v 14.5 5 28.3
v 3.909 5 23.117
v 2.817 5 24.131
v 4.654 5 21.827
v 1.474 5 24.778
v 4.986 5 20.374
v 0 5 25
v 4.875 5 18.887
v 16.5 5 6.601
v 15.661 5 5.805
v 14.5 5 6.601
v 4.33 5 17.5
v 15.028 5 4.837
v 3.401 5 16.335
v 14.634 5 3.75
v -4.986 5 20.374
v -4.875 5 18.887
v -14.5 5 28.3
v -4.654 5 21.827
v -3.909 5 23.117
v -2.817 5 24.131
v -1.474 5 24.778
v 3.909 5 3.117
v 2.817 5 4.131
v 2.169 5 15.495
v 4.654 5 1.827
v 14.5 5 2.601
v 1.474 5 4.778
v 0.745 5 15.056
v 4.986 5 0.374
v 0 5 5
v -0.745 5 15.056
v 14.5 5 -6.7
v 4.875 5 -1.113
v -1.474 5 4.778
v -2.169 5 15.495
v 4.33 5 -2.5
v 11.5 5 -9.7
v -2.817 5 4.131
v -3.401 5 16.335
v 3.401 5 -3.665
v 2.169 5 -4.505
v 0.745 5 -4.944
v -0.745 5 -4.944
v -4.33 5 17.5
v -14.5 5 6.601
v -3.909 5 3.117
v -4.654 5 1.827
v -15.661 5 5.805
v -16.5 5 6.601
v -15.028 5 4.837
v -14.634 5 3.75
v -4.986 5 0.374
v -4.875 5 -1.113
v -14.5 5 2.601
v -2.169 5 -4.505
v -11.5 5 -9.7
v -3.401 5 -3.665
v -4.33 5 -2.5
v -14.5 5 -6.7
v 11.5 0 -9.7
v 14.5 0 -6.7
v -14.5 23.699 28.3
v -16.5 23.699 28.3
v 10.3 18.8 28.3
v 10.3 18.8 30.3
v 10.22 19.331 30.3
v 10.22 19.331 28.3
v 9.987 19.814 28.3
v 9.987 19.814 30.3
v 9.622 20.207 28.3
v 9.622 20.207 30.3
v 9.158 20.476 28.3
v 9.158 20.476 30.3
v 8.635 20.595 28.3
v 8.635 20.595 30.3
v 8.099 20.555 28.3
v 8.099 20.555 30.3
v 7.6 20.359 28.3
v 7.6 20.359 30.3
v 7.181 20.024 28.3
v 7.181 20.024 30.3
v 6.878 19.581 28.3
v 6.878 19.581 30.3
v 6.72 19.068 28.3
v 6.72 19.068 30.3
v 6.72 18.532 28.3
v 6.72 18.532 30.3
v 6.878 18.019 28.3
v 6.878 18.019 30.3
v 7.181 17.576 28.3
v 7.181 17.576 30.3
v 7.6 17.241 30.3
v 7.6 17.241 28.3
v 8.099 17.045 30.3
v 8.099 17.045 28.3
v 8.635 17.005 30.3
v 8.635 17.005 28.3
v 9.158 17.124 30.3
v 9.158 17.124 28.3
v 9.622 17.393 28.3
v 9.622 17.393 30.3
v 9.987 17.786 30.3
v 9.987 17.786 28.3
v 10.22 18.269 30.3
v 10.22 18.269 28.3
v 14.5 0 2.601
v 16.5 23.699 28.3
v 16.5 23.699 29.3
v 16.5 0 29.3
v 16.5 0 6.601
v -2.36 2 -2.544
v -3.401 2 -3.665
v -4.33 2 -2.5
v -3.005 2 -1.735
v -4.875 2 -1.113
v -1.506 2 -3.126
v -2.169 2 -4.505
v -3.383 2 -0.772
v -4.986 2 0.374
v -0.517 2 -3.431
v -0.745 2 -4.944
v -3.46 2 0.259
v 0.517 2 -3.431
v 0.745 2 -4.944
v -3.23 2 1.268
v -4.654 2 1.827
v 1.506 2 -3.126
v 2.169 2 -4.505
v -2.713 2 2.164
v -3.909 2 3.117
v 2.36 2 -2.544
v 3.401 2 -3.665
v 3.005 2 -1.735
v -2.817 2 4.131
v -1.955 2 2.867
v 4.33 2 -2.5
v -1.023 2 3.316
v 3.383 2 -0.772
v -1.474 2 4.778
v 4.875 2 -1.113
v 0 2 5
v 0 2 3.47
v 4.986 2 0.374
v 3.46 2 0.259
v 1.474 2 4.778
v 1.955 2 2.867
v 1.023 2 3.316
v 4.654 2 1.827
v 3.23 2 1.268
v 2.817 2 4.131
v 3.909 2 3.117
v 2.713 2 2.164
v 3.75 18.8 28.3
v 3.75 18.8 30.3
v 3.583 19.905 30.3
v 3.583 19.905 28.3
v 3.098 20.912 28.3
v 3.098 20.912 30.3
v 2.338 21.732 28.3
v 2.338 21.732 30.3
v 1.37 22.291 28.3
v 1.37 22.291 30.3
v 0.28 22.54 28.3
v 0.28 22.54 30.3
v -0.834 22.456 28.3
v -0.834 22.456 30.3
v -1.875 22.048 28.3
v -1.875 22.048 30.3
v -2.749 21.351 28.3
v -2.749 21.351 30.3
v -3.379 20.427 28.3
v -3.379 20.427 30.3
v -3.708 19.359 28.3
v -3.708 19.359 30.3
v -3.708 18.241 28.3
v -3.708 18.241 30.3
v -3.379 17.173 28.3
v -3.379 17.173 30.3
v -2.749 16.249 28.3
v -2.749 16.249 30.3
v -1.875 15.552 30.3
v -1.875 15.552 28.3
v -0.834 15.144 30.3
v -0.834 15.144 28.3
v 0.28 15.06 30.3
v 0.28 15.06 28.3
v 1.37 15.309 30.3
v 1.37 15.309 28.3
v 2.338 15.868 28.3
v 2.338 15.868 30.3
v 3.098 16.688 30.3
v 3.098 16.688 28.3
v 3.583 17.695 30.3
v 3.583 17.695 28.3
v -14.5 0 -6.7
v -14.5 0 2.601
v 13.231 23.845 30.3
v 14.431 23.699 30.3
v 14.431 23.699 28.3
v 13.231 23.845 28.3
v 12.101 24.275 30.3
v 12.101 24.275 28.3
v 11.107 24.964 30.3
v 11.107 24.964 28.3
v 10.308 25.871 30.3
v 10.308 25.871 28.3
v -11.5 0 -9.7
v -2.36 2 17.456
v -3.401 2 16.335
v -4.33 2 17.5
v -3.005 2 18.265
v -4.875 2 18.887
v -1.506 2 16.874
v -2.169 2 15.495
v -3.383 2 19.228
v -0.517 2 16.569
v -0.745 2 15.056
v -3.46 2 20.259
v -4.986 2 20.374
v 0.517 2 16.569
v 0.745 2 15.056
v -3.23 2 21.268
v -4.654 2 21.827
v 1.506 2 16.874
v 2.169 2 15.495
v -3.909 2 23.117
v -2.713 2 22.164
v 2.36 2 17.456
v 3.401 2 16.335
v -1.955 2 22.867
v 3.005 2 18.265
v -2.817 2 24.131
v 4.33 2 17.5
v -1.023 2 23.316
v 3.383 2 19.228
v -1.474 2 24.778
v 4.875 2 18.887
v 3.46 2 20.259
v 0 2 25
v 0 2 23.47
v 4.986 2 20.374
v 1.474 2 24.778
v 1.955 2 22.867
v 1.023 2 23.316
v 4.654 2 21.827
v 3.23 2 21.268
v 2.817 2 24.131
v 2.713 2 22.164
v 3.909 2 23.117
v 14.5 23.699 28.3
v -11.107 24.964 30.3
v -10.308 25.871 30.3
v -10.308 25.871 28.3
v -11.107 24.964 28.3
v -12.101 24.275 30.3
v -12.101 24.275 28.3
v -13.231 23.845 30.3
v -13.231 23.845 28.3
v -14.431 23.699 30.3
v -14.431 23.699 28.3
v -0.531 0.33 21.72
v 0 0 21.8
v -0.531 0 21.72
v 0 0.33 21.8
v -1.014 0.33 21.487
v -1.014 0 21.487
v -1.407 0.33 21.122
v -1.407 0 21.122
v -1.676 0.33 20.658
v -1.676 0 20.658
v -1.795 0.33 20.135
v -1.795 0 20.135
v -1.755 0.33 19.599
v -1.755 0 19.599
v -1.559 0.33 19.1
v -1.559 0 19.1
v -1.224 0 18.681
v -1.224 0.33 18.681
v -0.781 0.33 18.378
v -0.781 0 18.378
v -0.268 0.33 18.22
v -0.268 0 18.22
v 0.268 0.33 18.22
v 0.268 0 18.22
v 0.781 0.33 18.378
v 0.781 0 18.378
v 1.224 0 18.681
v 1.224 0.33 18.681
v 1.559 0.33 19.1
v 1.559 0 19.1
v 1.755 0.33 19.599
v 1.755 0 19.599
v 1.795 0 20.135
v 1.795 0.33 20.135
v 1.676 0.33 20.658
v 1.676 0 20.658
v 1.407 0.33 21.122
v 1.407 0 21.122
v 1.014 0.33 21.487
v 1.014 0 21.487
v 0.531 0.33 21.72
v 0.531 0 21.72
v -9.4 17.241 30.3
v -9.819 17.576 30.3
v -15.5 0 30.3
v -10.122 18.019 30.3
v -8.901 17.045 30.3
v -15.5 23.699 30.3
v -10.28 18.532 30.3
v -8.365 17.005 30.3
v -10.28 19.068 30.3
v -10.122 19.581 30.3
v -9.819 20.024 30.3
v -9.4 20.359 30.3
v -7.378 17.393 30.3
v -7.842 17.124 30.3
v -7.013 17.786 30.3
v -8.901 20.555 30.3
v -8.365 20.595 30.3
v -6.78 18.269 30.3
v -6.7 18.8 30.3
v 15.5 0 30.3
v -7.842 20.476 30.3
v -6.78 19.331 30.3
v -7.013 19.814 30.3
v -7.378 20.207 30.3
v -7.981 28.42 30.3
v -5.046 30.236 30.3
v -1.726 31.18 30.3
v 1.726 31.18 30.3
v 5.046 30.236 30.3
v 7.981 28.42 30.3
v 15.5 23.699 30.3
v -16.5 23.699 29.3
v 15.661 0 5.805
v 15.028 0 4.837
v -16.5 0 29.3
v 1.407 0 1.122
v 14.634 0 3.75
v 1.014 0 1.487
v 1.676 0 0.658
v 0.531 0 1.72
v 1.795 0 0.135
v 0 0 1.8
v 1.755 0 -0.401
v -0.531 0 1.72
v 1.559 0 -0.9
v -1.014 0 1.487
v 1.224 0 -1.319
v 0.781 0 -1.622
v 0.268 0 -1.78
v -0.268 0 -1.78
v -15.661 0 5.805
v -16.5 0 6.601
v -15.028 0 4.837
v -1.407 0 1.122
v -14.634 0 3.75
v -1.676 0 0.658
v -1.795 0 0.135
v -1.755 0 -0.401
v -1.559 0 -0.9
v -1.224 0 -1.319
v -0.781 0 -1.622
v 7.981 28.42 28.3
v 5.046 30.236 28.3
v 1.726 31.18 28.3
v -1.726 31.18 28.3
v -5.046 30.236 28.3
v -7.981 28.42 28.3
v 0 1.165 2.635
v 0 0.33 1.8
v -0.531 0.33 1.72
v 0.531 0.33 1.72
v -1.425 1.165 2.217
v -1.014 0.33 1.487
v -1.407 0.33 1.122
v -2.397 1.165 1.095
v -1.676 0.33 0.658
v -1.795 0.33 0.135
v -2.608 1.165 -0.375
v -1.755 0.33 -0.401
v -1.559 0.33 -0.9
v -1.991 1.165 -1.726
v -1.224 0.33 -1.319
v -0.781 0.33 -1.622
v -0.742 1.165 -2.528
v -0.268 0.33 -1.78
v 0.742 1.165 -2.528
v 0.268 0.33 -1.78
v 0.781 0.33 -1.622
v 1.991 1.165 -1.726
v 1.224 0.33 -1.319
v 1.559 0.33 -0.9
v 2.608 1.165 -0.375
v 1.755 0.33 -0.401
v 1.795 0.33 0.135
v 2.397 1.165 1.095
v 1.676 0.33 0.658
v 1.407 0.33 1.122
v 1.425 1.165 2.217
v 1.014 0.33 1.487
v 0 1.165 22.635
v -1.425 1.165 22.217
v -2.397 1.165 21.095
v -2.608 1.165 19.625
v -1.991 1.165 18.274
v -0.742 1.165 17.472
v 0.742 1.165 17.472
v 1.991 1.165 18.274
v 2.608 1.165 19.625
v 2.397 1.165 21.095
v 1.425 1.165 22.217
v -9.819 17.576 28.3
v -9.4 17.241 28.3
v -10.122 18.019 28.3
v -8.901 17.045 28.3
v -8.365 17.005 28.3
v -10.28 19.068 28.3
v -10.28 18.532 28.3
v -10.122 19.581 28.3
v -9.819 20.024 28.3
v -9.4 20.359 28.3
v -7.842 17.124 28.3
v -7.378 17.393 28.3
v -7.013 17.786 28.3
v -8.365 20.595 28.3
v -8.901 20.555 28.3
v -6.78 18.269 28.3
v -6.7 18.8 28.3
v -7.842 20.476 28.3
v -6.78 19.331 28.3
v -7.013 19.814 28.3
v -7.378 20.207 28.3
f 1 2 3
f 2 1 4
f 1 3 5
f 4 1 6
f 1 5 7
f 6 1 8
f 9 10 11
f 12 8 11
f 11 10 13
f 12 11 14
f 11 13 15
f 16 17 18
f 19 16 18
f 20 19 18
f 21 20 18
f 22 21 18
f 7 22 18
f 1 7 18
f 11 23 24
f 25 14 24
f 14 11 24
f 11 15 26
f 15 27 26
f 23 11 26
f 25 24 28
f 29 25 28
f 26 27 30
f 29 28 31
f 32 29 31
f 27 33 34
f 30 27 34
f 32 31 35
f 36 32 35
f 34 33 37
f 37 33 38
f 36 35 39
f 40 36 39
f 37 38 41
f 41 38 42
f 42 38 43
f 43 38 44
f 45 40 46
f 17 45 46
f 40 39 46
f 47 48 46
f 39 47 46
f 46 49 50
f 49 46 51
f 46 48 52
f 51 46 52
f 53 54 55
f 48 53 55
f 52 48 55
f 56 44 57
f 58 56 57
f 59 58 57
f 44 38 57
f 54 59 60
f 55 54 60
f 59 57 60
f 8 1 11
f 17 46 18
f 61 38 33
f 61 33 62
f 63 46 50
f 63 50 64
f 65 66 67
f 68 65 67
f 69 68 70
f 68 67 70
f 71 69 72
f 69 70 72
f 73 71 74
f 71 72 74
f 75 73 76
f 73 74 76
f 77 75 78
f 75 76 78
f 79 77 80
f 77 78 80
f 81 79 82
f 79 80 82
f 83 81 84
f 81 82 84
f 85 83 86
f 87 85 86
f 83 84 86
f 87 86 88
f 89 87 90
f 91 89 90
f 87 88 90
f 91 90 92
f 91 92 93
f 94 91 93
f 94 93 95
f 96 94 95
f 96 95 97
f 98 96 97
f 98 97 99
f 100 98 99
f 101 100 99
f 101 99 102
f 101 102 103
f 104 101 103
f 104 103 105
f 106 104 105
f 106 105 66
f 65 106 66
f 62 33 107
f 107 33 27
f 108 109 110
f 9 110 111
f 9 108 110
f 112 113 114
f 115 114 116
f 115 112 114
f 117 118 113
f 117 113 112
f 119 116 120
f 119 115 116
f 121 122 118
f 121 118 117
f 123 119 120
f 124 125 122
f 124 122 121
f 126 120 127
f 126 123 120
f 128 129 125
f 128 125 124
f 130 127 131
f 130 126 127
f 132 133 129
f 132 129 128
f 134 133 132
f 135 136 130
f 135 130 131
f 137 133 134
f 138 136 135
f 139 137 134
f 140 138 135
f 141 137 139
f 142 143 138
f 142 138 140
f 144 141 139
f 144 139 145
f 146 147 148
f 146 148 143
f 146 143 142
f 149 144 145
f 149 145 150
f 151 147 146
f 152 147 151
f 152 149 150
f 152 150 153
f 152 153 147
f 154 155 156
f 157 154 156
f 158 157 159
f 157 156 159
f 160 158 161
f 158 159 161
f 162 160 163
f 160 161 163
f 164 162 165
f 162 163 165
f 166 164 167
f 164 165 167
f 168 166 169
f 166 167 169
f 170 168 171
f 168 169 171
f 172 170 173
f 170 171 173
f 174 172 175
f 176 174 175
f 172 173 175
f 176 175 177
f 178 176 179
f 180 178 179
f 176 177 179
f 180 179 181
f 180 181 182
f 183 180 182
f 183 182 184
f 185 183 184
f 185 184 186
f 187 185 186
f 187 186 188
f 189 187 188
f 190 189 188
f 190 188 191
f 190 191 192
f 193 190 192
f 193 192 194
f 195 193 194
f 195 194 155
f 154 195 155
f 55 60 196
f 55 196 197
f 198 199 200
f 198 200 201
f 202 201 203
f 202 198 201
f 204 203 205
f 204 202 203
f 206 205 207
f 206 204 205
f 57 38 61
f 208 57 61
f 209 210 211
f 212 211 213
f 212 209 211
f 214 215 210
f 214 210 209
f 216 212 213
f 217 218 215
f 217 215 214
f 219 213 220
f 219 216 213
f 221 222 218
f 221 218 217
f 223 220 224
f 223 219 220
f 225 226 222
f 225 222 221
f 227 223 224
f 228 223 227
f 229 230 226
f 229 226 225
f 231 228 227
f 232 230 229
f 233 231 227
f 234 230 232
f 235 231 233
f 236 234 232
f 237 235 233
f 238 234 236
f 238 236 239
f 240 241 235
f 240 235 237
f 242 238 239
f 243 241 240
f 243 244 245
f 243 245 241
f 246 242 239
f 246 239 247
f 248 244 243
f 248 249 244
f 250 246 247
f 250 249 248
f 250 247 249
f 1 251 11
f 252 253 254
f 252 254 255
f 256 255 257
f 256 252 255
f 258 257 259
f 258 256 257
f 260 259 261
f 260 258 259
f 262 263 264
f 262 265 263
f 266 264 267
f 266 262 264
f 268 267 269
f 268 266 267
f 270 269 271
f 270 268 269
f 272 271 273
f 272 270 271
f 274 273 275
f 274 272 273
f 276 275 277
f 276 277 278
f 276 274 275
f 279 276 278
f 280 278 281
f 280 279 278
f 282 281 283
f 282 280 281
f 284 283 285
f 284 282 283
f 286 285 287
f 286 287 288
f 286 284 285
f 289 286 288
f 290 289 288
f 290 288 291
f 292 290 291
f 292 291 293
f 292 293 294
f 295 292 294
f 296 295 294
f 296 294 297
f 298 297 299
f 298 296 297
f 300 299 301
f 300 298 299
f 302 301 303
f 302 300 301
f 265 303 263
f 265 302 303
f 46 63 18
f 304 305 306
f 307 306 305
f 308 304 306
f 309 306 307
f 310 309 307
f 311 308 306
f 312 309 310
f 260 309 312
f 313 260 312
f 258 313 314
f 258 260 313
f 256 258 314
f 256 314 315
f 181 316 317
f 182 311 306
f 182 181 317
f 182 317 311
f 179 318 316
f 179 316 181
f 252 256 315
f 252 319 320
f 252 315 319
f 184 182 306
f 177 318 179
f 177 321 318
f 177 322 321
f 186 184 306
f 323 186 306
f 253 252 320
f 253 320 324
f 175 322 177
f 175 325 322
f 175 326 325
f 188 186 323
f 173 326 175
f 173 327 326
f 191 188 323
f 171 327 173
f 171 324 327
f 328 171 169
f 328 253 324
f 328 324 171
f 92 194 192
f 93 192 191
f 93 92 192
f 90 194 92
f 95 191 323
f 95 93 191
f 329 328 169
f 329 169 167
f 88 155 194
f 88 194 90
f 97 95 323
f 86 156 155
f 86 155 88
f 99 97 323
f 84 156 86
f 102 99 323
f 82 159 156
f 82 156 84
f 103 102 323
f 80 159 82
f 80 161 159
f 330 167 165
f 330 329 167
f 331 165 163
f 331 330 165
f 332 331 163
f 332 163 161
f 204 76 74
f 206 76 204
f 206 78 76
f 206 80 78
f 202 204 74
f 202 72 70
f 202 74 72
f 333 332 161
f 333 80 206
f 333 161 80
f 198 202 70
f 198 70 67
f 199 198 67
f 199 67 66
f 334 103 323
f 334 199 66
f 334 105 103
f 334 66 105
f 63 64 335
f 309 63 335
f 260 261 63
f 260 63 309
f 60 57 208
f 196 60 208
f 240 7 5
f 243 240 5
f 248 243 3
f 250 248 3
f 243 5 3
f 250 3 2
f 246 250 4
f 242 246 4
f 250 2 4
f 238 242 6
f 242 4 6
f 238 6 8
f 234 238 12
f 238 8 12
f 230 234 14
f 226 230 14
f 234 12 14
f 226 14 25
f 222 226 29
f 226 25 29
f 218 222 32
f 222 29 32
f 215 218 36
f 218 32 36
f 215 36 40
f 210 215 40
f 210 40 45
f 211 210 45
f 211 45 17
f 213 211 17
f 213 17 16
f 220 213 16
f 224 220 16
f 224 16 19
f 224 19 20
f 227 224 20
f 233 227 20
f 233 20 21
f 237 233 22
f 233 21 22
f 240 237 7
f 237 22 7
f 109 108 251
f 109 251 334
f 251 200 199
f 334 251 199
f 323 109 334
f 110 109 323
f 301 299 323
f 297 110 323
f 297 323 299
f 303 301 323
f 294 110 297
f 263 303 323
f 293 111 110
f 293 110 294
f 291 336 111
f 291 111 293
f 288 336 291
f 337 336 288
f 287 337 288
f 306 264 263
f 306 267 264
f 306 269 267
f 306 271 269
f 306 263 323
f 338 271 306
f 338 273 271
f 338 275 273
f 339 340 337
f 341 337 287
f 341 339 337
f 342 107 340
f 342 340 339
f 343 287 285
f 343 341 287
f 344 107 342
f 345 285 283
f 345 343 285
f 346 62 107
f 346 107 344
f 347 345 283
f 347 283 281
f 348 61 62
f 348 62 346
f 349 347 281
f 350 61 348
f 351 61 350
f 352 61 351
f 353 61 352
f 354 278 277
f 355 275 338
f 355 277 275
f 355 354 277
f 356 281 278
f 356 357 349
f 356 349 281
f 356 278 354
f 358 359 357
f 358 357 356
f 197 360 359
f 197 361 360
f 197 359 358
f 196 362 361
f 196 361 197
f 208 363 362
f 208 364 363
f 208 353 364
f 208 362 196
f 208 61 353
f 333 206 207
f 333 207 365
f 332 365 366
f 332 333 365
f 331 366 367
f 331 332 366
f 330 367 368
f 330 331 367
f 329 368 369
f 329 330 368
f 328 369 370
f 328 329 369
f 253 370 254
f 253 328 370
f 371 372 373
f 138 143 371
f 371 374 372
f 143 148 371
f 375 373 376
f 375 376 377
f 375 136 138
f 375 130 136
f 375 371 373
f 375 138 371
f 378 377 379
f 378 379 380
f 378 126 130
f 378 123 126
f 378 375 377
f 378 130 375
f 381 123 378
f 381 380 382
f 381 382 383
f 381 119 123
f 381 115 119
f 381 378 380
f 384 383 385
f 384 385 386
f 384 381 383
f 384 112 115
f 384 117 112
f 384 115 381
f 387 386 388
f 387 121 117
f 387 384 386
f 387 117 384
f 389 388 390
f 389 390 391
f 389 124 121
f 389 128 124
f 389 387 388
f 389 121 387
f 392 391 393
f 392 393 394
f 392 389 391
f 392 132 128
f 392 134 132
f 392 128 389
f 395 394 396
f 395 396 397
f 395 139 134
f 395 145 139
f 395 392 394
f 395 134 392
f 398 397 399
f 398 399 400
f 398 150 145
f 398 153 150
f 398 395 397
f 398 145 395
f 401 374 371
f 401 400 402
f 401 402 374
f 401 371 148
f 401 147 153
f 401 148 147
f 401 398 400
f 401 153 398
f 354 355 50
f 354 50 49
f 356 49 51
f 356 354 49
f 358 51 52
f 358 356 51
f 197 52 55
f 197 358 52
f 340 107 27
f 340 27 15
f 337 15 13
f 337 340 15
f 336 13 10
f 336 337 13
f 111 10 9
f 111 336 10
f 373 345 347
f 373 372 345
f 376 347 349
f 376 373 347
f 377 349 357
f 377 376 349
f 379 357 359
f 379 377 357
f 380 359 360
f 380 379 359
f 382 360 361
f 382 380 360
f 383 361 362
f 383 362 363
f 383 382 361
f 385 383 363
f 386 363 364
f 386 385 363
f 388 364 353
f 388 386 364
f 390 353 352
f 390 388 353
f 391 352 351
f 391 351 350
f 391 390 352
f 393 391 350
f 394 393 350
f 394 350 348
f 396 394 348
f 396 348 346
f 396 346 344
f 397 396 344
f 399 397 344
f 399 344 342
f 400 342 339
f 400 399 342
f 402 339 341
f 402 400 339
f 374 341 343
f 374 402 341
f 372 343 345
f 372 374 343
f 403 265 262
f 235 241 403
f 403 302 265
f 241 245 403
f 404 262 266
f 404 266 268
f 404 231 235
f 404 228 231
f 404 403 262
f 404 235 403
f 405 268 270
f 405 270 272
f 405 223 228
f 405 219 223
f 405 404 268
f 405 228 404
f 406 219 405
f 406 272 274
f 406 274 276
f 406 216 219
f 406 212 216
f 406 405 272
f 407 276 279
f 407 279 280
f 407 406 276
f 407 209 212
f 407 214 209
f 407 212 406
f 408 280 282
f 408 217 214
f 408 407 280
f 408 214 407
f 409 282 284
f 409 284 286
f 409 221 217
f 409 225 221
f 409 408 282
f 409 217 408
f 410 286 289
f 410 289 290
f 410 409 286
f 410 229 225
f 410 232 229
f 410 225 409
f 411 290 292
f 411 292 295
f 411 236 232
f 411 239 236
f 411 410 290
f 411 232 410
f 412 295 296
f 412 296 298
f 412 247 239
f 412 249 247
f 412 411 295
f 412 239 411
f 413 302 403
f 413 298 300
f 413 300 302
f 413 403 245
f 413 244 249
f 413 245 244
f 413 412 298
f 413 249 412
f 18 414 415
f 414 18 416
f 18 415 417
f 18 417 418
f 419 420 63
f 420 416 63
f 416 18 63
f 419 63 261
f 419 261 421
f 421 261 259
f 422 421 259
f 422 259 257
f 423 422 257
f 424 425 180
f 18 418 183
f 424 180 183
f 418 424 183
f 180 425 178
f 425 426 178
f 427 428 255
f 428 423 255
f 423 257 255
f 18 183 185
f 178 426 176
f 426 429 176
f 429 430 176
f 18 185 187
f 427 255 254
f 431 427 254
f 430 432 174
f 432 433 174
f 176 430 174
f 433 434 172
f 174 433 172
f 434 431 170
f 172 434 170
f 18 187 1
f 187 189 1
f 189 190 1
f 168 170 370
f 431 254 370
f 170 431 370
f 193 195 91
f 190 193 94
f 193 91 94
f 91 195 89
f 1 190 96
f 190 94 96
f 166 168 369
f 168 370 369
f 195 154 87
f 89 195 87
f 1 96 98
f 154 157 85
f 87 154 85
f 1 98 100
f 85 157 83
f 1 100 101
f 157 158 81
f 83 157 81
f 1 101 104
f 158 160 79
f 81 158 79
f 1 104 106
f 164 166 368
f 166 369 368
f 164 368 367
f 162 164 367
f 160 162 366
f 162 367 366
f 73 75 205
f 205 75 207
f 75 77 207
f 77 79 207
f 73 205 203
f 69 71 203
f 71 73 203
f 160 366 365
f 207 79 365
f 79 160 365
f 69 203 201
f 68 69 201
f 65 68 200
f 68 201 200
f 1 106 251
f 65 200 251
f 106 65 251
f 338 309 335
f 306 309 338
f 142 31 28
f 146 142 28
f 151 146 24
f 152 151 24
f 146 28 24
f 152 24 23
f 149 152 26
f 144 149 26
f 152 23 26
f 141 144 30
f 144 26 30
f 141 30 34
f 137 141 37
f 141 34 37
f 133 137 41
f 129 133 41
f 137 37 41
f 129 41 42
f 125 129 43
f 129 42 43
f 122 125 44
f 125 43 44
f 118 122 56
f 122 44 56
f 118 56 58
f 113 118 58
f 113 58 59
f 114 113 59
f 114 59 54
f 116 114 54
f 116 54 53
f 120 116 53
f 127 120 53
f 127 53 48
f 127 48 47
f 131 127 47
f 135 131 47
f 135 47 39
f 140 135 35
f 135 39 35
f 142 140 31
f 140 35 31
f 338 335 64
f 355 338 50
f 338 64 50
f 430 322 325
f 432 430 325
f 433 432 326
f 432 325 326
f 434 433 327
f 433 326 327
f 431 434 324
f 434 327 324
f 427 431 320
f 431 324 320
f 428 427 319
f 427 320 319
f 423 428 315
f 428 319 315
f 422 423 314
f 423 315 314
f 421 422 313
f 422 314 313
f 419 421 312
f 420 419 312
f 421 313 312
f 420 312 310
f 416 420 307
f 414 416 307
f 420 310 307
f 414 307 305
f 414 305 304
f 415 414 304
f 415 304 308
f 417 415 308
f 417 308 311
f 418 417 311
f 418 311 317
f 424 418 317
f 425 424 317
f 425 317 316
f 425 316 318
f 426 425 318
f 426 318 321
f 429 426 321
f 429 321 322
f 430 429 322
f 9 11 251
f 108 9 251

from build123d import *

# Parameters (mm, degrees)
SKETCH1_W                                    = 23
SKETCH1_H                                    = 40
SKETCH1_R                                    = 1.75
BOSS_EXTRUDE1_DEPTH                          = 5
SKETCH2_W                                    = 23
SKETCH2_H                                    = 2
BOSS_EXTRUDE2_DEPTH                          = 50
SKETCH3_R                                    = 1.8
SKETCH3_R_2                                  = 3.75
CUT_EXTRUDE1_DEPTH                           = 69.972820734
BOSS_EXTRUDE3_DEPTH                          = 3
BOSS_EXTRUDE4_START                          = -23
BOSS_EXTRUDE4_DEPTH                          = 3
BOSS_EXTRUDE5_DEPTH                          = 2
BOSS_EXTRUDE6_START                          = -29
BOSS_EXTRUDE6_DEPTH                          = 2
SKETCH6_R                                    = 5
CUT_EXTRUDE2_DEPTH                           = 3
CSK_FOR_M3_HEX_SOCKET_COUNTERSUNK_HE_2_COUNT = 2
CSK_FOR_M3_HEX_SOCKET_COUNTERSUNK_HE_2_PITCH = 20
CHAMFER1_SIZE                                = 3
CHAMFER2_SIZE                                = 1
FILLET1_R                                    = 5


with BuildPart() as part:
    # Sketch1 → Boss-Extrude1 (new body)
    with BuildSketch(Plane(origin=(0, 0, 0), x_dir=(1, 0, 0), z_dir=(0, 1, 0))):
        with Locations((0, -10.3)):
            Rectangle(SKETCH1_W, SKETCH1_H)
        with Locations(Location((0, 0, 0), (0, 0, 270))):
            Circle(SKETCH1_R, mode=Mode.SUBTRACT)
        with Locations(Location((0, -20, 0), (0, 0, 270))):
            Circle(SKETCH1_R, mode=Mode.SUBTRACT)
    extrude(amount=BOSS_EXTRUDE1_DEPTH)

    # Sketch2 → Boss-Extrude2 (add)
    with BuildSketch(Plane(origin=(0, 5, 0), x_dir=(1, 0, 0), z_dir=(0, 1, 0))):
        with Locations((0, -29.3)):
            Rectangle(SKETCH2_W, SKETCH2_H)
    extrude(amount=BOSS_EXTRUDE2_DEPTH)

    # Sketch3 → Cut-Extrude1 (cut, through all)
    with BuildSketch(Plane.XY.offset(30.3)):
        with Locations((-8.5, 18.8)):
            Circle(SKETCH3_R)
        with Locations((8.5, 18.8)):
            Circle(SKETCH3_R)
        with Locations((0, 18.8)):
            Circle(SKETCH3_R_2)
        with BuildLine():
            Line((-11.5, 23.698979486), (-11.5, 55))
            Line((-11.5, 55), (11.5, 55))
            Line((11.5, 55), (11.5, 23.698979486))
            ThreePointArc((11.5, 23.698979486), (0, 31.3), (-11.5, 23.698979486))
        make_face()
    extrude(amount=-CUT_EXTRUDE1_DEPTH, mode=Mode.SUBTRACT)

    # Sketch4 → Boss-Extrude3 (add)
    with BuildSketch(Plane.ZY.offset(11.5)):
        Polygon((30.3, 0), (30.3, 23.698979486), (28.3, 23.698979486), (28.3, 5), (-9.7, 5), (-9.7, 0), align=None)
    extrude(amount=BOSS_EXTRUDE3_DEPTH)

    # Sketch4<2> → Boss-Extrude4 (add)
    with BuildSketch(Plane.ZY.offset(11.5).offset(BOSS_EXTRUDE4_START)):
        Polygon((30.3, 0), (30.3, 23.698979486), (28.3, 23.698979486), (28.3, 5), (-9.7, 5), (-9.7, 0), align=None)
    extrude(amount=-BOSS_EXTRUDE4_DEPTH)

    # Sketch5 → Boss-Extrude5 (add)
    with BuildSketch(Plane(origin=(14.5, 0, 0), x_dir=(0, 0, -1), z_dir=(1, 0, 0))):
        Polygon((-30.3, 23.698979486), (-30.3, 0), (-6.601020514, 0), (-6.601020514, 5), (-28.3, 23.698979486), align=None)
    extrude(amount=BOSS_EXTRUDE5_DEPTH)

    # Sketch5<2> → Boss-Extrude6 (add)
    with BuildSketch(Plane(origin=(14.5, 0, 0), x_dir=(0, 0, -1), z_dir=(1, 0, 0)).offset(BOSS_EXTRUDE6_START)):
        Polygon((-30.3, 23.698979486), (-30.3, 0), (-6.601020514, 0), (-6.601020514, 5), (-28.3, 23.698979486), align=None)
    extrude(amount=-BOSS_EXTRUDE6_DEPTH)

    # Sketch6 → Cut-Extrude2 (cut)
    with BuildSketch(Plane(origin=(0, 5, 0), x_dir=(1, 0, 0), z_dir=(0, 1, 0))):
        with Locations(Location((0, 0, 0), (0, 0, 270))):
            Circle(SKETCH6_R)
        with Locations(Location((0, -20, 0), (0, 0, 270))):
            Circle(SKETCH6_R)
    extrude(amount=-CUT_EXTRUDE2_DEPTH, mode=Mode.SUBTRACT)

    # Sketch8 → CSK for M3 Hex Socket Countersunk Head Screw1 (revolve, cut)
    with BuildSketch(Plane(origin=(0, 2, 0), x_dir=(0, 0, 1), z_dir=(1, 0, 0))):
        Polygon((0, 0), (0, 2), (1.8, 2), (1.8, 1.67), (3.47, 0), align=None)
    csk_for_m3_hex_socket_countersunk_head_s = revolve(axis=Axis((0, 8.35, 0), (0, -1, 0)), mode=Mode.SUBTRACT)

    # CSK for M3 Hex Socket Countersunk He 2: CSK for M3 Hex Socket Countersunk Head Screw1 ×2
    with Locations(*[(0, 0, i * CSK_FOR_M3_HEX_SOCKET_COUNTERSUNK_HE_2_PITCH) for i in range(1, CSK_FOR_M3_HEX_SOCKET_COUNTERSUNK_HE_2_COUNT)]):
        add(csk_for_m3_hex_socket_countersunk_head_s, mode=Mode.SUBTRACT)

    # Chamfer1
    chamfer1_edges = [part.edges().sort_by_distance(p)[0] for p in [
        (-14.5, 2.5, -9.7),
        (14.5, 2.5, -9.7),
    ]]
    chamfer(chamfer1_edges, length=CHAMFER1_SIZE)

    # Chamfer2
    chamfer2_edges = [part.edges().sort_by_distance(p)[0] for p in [
        (16.5, 11.849489743, 30.3),
        (-16.5, 11.849489743, 30.3),
    ]]
    chamfer(chamfer2_edges, length=CHAMFER2_SIZE)

    # Fillet1
    # the kernel refuses this fillet: 5 mm, written as the material it adds along each edge
    with BuildSketch(Plane(origin=(11.5, 23.698979486, 30.3), x_dir=(1, 0, 0), z_dir=(0, 0, -1))) as fillet1_piece_1:
        with BuildLine():
            CenterArc((2.931223273, -5), FILLET1_R, 90, 55.552144514)
            ThreePointArc((-1.191983377, -2.171720147), (-0.54205816, -1.115462354), (0, 0))
            Line((0, 0), (2.931223273, 0))
        make_face()
    extrude(amount=2)
    with BuildSketch(Plane(origin=(-11.5, 23.698979486, 30.3), x_dir=(-1, 0, 0), z_dir=(0, 0, -1))) as fillet1_piece_2:
        with BuildLine():
            CenterArc((2.931223273, 5), FILLET1_R, 214.447855486, 55.552144514)
            ThreePointArc((-1.191983377, 2.171720147), (-0.54205816, 1.115462354), (0, 0))
            Line((0, 0), (2.931223273, 0))
        make_face()
    extrude(amount=2)
    with BuildSketch(Plane(origin=(-14.5, 0, 6.601020514), x_dir=(-1, 0, 0), z_dir=(0, 1, 0))) as fillet1_piece_3:
        with BuildLine():
            CenterArc((5, -4), FILLET1_R, 126.869897646, 53.130102354)
            Line((0, -4), (0, 0))
            Line((0, 0), (2, 0))
        make_face()
    extrude(amount=5)
    with BuildSketch(Plane(origin=(14.5, 0, 6.601020514), x_dir=(1, 0, 0), z_dir=(0, 1, 0))) as fillet1_piece_4:
        with BuildLine():
            CenterArc((5, 4), FILLET1_R, 180, 53.130102354)
            Line((0, 4), (0, 0))
            Line((0, 0), (2, 0))
        make_face()
    extrude(amount=5)


solid = part.part
